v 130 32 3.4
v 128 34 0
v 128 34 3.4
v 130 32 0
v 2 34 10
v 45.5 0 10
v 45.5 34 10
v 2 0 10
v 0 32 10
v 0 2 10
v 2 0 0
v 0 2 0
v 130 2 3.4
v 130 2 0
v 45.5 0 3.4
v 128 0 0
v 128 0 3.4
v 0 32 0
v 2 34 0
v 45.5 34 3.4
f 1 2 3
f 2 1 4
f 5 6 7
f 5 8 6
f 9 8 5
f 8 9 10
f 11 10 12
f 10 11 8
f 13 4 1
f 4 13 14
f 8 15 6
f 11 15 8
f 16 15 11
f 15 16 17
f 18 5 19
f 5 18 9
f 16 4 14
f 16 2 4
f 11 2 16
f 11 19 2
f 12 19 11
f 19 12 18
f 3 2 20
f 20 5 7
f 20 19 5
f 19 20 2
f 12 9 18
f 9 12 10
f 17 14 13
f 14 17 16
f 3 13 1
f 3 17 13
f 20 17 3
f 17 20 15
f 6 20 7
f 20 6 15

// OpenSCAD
$fn = 32;

// ----------------------------------------------------------------------
// Stepped bar: endstep, 130 x 34 x 10/3.4 mm
// ----------------------------------------------------------------------

// --- parameters (mm) ---
bar_l = 130;              // bar length, X
bar_w = 34;               // bar width, Y
plate_t = 10;             // thickness of the thick zone, Z
thin_t = 3.4;             // thickness of the thin zone
corner_c = 2;             // corner chamfer of the bar
step_cut = 6.6;           // material removed from the thin zone
step_x = 45.5;            // step position from the left end
depth_1 = 6.6;            // depth of cut 1 from the top face

profile = [[2, 0], [128, 0], [130, 2], [130, 32], [128, 34], [2, 34], [0, 32], [0, 2]];  // primary outline, 8 points, counter clockwise
void_1 = [[45.5, -1], [131, -1], [131, 35], [45.5, 35]];  // thin zone beyond the step, 4 points

// --- the one profile operation ---
difference() {
  linear_extrude(height = plate_t) polygon(points = profile);
  translate([0, 0, plate_t - depth_1])
    linear_extrude(height = depth_1 + 1) polygon(points = void_1);
}
